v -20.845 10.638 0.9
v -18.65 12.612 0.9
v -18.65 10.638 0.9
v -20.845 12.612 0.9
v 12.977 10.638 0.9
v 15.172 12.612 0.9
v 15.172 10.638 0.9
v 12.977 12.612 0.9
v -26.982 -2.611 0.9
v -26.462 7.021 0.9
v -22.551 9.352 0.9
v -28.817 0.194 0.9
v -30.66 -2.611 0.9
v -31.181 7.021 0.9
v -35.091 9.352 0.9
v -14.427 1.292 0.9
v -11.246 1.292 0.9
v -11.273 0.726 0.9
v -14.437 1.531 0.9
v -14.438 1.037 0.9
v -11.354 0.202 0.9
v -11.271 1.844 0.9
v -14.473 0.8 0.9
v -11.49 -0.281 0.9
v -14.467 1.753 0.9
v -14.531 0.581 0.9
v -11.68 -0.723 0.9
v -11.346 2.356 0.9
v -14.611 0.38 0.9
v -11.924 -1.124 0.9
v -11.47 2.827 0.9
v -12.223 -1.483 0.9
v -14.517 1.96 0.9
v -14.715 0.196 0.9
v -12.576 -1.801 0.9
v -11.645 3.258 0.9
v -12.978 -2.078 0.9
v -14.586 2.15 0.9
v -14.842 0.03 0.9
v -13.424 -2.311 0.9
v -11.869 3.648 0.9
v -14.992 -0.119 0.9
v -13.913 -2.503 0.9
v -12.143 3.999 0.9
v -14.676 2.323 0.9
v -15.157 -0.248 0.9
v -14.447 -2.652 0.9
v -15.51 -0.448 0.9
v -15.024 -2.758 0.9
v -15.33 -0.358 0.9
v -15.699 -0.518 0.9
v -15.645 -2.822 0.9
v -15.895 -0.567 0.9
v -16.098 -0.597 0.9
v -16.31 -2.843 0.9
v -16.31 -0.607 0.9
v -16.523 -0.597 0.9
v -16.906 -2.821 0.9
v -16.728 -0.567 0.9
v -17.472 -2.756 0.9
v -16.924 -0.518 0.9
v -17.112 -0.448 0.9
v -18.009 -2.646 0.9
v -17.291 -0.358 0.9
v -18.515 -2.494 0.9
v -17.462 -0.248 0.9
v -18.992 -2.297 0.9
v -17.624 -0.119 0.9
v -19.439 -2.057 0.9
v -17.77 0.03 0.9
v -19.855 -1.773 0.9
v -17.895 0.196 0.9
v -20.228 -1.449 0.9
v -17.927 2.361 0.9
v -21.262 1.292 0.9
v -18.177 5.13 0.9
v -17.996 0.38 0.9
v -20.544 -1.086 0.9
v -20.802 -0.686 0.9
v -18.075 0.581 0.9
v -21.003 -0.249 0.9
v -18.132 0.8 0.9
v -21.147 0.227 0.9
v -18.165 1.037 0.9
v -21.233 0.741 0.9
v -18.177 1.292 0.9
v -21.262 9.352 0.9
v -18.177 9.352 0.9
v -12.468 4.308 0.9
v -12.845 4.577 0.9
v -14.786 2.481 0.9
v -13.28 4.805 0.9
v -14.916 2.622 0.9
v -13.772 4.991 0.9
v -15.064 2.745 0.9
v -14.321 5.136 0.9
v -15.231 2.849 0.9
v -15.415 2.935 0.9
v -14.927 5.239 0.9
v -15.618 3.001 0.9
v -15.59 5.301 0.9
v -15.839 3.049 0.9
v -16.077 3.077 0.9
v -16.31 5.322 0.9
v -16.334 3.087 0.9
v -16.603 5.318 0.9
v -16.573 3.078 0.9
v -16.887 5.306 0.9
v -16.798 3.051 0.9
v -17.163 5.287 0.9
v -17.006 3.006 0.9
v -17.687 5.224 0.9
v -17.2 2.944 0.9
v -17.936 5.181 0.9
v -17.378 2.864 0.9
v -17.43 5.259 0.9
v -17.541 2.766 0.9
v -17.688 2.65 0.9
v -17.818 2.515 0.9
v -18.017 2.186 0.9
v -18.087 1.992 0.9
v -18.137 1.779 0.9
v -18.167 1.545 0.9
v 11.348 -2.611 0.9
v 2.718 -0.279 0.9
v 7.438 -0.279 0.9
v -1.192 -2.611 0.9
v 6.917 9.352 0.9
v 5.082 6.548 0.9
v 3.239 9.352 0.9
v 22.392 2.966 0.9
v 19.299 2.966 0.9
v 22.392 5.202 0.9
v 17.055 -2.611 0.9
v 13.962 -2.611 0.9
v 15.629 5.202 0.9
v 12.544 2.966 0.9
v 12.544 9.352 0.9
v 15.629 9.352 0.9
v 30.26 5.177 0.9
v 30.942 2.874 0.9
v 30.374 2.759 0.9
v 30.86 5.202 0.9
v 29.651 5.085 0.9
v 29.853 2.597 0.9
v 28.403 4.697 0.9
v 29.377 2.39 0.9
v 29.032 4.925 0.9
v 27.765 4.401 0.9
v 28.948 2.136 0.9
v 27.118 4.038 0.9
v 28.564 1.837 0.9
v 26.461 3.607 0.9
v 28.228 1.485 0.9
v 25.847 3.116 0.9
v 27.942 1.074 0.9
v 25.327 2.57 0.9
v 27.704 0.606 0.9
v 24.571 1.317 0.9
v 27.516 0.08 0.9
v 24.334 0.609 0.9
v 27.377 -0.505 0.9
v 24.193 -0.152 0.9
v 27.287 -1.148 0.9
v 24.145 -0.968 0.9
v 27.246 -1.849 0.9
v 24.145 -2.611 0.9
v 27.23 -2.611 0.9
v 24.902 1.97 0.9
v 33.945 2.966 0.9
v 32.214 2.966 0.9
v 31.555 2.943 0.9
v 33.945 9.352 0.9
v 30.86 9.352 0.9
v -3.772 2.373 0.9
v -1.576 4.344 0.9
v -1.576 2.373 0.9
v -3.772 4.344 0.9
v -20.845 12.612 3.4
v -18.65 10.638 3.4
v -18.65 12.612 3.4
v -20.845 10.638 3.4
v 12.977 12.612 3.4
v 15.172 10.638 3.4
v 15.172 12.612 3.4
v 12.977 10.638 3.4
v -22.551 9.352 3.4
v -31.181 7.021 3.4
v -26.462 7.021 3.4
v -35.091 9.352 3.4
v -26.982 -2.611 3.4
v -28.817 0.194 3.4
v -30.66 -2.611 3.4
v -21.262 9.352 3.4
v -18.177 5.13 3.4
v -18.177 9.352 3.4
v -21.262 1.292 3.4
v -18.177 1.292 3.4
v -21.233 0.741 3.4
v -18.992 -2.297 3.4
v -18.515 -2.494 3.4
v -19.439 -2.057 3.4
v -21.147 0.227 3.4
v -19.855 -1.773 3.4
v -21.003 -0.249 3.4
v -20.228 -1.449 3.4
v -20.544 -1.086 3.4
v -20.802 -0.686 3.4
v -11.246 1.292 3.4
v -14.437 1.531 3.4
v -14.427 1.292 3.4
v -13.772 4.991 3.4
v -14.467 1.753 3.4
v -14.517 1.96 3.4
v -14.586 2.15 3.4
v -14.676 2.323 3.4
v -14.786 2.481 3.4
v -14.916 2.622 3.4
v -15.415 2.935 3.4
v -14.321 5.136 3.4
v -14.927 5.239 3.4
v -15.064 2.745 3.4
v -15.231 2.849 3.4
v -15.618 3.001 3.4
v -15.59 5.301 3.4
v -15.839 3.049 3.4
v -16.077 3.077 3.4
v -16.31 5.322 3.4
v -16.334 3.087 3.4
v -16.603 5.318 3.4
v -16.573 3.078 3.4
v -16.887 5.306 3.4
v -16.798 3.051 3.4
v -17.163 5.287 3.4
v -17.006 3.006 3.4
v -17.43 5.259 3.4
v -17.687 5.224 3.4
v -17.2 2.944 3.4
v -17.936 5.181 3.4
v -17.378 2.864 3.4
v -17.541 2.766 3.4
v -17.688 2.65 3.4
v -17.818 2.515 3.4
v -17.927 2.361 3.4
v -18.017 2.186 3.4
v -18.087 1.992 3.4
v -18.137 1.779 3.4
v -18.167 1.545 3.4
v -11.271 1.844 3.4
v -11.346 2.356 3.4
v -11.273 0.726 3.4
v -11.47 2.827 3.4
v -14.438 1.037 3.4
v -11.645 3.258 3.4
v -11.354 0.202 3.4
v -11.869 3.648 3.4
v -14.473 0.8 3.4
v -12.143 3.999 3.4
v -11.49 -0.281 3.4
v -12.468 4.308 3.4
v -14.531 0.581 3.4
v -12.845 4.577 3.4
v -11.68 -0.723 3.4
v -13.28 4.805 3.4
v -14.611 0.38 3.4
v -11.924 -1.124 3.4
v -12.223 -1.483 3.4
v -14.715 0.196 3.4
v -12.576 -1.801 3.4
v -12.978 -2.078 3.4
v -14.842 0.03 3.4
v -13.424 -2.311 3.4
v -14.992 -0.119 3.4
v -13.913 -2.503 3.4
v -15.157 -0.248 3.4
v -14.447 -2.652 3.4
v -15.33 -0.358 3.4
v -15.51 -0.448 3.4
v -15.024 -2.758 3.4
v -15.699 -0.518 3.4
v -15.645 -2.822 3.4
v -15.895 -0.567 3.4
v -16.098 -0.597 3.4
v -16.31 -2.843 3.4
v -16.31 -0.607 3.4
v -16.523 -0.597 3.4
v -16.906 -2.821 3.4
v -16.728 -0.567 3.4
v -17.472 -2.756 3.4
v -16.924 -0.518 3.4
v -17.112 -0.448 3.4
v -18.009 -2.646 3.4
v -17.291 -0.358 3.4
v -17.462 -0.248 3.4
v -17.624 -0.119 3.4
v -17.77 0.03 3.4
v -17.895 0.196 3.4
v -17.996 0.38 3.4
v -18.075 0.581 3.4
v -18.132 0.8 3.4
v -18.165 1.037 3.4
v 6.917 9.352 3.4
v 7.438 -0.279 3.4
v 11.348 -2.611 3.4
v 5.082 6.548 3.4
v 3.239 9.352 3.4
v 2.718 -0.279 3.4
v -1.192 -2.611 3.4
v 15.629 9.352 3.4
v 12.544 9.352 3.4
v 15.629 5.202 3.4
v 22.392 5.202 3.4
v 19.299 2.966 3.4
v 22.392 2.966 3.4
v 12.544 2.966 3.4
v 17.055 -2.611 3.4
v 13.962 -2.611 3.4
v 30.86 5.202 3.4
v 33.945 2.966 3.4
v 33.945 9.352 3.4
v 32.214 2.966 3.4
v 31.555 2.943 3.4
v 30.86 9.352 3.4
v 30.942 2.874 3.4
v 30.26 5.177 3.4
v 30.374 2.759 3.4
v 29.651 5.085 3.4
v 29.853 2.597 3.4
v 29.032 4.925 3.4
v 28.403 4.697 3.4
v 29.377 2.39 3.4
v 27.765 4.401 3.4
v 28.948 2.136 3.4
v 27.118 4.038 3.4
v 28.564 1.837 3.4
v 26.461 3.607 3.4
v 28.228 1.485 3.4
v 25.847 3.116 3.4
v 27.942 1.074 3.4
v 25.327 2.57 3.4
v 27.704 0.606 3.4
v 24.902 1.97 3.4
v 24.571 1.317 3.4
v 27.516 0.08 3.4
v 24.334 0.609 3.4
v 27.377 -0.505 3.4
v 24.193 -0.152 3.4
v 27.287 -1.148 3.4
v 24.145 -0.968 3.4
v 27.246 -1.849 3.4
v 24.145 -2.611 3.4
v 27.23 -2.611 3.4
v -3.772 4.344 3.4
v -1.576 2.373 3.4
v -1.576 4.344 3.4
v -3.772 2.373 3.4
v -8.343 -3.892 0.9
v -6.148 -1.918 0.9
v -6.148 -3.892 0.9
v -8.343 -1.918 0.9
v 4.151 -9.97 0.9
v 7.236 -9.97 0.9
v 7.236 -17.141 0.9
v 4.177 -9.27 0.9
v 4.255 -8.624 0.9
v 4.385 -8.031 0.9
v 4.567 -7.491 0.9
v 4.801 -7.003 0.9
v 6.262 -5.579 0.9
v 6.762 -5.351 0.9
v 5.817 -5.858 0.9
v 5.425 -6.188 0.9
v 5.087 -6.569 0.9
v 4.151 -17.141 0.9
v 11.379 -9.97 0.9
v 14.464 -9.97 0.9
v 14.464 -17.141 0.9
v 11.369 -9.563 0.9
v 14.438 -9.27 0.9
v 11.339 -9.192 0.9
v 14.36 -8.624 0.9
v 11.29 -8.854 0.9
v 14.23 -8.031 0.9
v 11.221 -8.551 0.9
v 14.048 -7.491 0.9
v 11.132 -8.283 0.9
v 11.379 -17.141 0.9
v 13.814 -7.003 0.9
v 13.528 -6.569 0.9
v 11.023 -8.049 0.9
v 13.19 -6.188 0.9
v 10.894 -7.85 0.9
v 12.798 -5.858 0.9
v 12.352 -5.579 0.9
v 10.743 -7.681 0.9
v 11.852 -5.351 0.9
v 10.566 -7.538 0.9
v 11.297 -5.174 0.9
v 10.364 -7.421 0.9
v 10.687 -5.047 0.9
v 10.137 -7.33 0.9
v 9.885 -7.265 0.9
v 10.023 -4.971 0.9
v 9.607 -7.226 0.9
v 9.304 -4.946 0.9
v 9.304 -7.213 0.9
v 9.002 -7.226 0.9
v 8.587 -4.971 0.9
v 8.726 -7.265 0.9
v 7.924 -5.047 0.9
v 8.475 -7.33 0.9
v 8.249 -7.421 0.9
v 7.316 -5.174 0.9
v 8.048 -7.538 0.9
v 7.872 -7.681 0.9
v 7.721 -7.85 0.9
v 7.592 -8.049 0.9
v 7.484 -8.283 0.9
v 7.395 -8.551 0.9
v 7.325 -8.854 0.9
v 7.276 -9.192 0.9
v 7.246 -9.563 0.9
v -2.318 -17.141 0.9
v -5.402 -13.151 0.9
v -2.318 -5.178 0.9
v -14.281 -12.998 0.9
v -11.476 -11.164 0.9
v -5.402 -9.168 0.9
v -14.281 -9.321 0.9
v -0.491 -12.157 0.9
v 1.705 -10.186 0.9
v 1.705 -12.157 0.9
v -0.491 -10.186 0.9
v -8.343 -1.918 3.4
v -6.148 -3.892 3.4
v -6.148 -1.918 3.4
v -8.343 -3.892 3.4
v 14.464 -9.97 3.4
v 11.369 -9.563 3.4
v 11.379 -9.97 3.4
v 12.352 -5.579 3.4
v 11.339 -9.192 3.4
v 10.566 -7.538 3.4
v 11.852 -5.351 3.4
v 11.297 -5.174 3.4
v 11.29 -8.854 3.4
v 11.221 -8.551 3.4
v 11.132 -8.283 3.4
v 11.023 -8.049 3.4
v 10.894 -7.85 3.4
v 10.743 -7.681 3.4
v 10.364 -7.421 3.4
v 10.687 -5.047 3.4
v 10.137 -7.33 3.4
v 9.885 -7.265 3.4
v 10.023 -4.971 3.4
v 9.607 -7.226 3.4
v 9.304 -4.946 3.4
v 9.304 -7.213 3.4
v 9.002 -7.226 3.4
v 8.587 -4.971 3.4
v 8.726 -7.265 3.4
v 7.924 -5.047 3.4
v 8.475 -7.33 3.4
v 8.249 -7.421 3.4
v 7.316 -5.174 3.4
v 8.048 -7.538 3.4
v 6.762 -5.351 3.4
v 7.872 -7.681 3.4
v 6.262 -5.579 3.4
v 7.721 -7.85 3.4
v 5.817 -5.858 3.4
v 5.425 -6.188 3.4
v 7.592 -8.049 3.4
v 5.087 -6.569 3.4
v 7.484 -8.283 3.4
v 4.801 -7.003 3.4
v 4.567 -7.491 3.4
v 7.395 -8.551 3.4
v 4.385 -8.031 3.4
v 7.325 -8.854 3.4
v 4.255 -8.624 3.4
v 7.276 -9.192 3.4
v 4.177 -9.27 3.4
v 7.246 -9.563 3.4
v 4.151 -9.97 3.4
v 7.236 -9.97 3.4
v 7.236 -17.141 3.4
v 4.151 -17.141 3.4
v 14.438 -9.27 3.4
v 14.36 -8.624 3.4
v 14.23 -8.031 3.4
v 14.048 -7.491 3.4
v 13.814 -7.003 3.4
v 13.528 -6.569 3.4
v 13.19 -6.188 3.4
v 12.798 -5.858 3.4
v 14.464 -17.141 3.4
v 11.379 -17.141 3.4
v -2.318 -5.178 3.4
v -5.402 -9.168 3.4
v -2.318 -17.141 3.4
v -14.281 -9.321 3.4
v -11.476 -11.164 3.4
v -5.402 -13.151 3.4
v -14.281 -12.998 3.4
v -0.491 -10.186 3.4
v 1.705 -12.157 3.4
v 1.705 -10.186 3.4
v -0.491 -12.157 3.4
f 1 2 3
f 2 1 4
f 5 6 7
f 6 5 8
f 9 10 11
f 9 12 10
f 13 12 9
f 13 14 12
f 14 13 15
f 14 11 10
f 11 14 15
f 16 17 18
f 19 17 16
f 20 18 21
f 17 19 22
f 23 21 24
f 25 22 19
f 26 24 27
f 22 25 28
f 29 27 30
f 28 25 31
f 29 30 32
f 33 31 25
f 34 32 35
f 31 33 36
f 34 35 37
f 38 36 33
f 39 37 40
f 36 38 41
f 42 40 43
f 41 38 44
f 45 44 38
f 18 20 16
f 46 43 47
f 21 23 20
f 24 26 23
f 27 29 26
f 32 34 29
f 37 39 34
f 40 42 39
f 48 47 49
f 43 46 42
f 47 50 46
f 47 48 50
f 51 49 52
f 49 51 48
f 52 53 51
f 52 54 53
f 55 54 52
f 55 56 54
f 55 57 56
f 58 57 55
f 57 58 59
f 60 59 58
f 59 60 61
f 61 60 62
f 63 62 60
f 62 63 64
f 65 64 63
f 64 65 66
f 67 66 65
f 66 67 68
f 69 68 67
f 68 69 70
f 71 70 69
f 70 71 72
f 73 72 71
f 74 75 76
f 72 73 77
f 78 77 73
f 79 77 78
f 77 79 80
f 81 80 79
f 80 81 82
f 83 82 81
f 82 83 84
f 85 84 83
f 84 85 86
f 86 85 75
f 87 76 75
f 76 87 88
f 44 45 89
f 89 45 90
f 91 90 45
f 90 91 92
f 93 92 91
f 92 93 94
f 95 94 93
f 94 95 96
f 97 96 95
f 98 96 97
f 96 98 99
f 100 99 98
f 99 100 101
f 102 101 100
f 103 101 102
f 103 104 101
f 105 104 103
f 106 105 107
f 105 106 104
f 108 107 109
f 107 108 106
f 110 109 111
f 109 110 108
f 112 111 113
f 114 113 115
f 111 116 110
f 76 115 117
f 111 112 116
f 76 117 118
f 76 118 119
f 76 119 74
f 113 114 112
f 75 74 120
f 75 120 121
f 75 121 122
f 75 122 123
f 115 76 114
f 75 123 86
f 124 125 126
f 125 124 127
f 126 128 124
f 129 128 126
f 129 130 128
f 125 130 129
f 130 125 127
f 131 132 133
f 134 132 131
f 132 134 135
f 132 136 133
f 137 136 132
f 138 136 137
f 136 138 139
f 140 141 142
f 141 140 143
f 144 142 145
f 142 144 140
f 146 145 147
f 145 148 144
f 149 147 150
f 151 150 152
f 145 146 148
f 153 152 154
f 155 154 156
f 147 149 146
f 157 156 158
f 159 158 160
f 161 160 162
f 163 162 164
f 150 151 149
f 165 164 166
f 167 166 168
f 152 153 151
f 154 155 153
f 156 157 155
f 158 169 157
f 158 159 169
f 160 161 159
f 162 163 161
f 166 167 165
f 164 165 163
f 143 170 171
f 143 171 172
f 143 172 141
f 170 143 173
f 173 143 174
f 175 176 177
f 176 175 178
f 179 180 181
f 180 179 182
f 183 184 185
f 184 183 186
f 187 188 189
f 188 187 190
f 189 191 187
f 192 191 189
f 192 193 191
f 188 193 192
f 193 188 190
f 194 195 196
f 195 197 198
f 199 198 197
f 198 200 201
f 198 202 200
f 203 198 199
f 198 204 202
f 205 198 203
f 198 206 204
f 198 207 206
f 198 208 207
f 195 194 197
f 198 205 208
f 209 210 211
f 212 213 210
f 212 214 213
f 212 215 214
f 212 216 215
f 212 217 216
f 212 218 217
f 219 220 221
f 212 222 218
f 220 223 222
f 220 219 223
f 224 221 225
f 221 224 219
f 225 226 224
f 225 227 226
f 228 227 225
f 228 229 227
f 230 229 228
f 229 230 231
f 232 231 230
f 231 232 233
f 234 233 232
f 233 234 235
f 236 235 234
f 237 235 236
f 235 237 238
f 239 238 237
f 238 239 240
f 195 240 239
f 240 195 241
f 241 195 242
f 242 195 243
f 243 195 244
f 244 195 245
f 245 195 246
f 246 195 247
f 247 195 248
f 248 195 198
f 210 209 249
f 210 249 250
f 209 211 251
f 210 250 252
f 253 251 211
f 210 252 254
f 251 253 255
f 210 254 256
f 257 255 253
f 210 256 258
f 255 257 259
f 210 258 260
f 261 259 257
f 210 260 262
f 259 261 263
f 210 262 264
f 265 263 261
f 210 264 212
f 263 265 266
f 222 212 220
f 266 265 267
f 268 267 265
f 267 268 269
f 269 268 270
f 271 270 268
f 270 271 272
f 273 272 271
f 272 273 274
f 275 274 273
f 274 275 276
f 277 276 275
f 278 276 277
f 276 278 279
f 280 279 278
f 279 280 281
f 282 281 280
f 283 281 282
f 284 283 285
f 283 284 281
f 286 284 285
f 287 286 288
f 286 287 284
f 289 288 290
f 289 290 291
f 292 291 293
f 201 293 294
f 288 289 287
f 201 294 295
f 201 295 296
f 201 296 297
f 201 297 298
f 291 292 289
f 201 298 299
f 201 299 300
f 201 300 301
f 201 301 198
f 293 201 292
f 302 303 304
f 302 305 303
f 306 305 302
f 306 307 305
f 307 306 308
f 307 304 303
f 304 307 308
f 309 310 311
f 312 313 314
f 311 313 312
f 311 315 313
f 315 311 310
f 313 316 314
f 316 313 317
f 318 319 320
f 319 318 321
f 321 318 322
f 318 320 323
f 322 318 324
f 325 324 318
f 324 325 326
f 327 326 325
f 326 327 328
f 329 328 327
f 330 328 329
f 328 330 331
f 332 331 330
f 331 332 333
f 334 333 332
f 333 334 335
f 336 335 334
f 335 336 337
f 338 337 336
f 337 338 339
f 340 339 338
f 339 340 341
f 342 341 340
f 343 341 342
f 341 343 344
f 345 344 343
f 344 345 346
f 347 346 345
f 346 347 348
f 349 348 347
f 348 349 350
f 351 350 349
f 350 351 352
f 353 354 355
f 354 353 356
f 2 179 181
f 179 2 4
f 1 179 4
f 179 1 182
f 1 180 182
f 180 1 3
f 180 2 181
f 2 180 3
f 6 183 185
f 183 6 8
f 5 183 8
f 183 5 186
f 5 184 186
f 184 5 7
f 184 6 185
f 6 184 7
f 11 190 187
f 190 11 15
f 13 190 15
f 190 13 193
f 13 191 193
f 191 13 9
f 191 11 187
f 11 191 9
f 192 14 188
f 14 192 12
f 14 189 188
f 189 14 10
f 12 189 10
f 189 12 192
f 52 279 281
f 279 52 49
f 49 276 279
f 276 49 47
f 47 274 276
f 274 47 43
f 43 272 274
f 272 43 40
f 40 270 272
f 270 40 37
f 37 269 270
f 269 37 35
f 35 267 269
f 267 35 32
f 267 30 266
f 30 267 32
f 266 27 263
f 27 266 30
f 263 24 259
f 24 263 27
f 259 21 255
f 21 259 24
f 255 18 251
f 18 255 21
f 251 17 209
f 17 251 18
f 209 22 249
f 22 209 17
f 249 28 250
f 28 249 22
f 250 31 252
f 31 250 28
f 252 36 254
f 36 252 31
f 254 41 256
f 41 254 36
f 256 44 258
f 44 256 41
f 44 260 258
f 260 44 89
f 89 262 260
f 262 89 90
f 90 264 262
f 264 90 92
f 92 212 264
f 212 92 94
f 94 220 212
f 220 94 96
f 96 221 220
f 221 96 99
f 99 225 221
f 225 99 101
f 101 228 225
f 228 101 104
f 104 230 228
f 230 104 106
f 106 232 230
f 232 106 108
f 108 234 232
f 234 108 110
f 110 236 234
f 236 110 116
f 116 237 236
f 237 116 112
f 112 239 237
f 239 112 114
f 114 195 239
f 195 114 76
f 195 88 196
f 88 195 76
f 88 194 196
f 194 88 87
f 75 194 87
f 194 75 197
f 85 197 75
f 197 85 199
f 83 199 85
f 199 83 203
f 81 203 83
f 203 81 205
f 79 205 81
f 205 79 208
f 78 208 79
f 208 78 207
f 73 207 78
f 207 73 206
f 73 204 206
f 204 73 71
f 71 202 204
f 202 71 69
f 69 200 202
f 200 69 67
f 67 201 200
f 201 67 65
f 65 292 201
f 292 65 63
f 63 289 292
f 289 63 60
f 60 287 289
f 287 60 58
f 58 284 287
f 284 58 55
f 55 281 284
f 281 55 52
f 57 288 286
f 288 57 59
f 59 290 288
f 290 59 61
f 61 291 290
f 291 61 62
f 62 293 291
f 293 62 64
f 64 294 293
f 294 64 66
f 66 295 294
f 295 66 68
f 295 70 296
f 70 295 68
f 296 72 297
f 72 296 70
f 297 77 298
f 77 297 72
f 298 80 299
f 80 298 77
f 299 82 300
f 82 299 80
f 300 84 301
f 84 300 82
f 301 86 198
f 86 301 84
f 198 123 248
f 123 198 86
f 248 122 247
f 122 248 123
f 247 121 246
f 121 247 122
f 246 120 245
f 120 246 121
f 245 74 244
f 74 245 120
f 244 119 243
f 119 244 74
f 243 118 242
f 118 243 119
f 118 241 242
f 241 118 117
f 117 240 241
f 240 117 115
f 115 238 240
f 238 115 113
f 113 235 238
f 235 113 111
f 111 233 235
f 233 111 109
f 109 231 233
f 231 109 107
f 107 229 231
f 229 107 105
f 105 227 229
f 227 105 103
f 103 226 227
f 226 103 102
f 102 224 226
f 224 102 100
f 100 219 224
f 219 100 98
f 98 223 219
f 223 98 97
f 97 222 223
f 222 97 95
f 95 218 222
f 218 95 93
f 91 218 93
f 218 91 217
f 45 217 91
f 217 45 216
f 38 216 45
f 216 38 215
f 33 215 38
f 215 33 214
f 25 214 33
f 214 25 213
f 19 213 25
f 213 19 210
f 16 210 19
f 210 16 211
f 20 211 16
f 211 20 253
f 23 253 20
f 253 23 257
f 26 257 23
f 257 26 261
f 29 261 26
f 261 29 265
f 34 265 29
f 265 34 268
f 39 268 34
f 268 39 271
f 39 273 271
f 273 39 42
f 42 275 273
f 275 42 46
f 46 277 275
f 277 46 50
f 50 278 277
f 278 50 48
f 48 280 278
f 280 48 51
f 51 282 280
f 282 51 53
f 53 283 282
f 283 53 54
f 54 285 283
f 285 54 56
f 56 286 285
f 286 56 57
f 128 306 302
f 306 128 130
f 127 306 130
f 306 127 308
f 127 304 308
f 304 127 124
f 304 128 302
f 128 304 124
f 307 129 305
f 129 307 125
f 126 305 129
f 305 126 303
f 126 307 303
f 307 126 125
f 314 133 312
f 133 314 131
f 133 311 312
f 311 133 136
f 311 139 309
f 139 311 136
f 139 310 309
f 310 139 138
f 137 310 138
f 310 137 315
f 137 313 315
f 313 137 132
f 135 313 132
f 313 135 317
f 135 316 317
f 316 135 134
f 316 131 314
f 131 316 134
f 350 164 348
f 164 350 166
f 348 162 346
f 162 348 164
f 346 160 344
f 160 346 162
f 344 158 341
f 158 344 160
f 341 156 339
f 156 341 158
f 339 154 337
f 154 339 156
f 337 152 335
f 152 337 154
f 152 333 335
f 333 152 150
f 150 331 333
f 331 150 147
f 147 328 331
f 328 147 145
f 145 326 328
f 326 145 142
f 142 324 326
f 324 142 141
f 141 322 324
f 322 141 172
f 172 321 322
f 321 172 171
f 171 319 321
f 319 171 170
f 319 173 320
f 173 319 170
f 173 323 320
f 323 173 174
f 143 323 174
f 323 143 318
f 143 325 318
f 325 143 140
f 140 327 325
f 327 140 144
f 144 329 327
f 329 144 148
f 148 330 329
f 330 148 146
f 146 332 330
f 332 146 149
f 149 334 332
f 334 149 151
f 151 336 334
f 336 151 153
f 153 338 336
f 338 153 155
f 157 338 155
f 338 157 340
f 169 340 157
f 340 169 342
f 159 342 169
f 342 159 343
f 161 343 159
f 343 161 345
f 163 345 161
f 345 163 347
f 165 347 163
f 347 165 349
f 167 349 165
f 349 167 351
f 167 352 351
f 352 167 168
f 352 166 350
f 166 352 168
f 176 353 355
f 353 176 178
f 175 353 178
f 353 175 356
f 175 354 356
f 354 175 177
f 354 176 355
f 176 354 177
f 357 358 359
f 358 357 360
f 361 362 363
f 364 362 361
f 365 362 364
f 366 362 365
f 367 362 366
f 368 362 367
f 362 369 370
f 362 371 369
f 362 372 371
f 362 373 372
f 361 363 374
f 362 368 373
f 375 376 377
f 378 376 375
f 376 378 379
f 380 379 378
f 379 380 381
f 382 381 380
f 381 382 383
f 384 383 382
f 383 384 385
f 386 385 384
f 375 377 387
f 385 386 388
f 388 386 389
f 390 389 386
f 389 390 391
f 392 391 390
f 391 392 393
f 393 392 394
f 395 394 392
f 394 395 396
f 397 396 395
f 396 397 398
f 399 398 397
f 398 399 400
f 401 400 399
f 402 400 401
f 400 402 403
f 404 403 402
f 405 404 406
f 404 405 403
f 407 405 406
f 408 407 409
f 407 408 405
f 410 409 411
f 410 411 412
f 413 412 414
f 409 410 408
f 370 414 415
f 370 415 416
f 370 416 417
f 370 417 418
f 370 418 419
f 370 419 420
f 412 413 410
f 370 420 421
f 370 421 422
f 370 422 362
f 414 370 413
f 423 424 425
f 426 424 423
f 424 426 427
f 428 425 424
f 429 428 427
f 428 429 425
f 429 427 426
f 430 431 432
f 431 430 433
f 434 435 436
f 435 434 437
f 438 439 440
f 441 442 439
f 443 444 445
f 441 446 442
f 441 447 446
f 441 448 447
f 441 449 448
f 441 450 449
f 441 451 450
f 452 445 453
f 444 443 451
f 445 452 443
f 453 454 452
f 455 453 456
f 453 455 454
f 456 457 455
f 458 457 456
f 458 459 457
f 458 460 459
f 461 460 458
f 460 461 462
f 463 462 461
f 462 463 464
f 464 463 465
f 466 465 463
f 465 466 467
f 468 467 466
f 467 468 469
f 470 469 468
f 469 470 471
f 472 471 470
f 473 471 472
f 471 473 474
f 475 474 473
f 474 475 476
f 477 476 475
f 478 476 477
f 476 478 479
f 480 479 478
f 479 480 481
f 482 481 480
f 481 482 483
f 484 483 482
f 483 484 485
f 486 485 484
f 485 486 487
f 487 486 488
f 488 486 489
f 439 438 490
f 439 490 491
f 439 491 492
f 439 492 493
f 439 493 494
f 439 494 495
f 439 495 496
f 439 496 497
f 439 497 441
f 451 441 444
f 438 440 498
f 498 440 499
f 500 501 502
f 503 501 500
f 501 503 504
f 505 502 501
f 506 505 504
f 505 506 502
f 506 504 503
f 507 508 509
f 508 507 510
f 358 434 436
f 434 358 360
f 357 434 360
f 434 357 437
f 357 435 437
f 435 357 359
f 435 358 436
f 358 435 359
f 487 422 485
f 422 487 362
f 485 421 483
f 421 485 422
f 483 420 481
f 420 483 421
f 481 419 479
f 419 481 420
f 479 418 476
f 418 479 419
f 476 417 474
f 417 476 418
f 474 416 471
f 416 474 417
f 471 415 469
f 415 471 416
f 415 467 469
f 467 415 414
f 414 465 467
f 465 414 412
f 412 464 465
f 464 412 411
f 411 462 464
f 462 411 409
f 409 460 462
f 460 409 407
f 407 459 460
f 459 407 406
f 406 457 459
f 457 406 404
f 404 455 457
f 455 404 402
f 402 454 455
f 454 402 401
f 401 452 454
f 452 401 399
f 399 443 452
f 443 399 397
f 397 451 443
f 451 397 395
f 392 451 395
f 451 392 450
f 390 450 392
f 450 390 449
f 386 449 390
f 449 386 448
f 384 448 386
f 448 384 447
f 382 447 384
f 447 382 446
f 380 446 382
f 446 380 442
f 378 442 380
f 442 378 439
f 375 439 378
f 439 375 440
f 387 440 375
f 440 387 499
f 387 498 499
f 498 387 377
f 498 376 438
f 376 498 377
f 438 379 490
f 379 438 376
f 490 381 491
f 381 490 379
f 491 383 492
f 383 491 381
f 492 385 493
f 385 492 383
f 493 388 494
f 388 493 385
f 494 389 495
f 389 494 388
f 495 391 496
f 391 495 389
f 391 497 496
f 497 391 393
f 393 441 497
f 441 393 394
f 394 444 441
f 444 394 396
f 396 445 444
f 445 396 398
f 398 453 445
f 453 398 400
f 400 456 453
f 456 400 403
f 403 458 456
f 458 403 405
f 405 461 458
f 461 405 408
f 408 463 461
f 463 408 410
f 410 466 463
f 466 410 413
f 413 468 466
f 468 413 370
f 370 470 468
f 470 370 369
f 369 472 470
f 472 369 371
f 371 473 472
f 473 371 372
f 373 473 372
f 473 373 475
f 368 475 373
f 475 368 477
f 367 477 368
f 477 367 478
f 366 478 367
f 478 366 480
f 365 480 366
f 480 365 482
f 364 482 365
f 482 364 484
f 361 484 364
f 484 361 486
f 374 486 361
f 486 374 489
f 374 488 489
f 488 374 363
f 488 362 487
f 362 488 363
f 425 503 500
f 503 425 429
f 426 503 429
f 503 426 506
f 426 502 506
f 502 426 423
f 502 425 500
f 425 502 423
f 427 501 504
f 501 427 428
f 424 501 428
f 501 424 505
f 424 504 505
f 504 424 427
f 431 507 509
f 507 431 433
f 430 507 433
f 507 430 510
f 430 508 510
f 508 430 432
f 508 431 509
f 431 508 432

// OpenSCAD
$fn = 48;
  // syllabics (overlaid on icon, tallest)
  translate([0, 4.708, 0.900]) linear_extrude(height=2.500) text("ᐁᑳ ᐎᔮᓱ", size=11.816, halign="center", valign="center", font="Euphemia UCAS:style=Bold");
  translate([0, -9.708, 0.900]) linear_extrude(height=2.500) text("ᐚᑎ", size=11.816, halign="center", valign="center", font="Euphemia UCAS:style=Bold");
